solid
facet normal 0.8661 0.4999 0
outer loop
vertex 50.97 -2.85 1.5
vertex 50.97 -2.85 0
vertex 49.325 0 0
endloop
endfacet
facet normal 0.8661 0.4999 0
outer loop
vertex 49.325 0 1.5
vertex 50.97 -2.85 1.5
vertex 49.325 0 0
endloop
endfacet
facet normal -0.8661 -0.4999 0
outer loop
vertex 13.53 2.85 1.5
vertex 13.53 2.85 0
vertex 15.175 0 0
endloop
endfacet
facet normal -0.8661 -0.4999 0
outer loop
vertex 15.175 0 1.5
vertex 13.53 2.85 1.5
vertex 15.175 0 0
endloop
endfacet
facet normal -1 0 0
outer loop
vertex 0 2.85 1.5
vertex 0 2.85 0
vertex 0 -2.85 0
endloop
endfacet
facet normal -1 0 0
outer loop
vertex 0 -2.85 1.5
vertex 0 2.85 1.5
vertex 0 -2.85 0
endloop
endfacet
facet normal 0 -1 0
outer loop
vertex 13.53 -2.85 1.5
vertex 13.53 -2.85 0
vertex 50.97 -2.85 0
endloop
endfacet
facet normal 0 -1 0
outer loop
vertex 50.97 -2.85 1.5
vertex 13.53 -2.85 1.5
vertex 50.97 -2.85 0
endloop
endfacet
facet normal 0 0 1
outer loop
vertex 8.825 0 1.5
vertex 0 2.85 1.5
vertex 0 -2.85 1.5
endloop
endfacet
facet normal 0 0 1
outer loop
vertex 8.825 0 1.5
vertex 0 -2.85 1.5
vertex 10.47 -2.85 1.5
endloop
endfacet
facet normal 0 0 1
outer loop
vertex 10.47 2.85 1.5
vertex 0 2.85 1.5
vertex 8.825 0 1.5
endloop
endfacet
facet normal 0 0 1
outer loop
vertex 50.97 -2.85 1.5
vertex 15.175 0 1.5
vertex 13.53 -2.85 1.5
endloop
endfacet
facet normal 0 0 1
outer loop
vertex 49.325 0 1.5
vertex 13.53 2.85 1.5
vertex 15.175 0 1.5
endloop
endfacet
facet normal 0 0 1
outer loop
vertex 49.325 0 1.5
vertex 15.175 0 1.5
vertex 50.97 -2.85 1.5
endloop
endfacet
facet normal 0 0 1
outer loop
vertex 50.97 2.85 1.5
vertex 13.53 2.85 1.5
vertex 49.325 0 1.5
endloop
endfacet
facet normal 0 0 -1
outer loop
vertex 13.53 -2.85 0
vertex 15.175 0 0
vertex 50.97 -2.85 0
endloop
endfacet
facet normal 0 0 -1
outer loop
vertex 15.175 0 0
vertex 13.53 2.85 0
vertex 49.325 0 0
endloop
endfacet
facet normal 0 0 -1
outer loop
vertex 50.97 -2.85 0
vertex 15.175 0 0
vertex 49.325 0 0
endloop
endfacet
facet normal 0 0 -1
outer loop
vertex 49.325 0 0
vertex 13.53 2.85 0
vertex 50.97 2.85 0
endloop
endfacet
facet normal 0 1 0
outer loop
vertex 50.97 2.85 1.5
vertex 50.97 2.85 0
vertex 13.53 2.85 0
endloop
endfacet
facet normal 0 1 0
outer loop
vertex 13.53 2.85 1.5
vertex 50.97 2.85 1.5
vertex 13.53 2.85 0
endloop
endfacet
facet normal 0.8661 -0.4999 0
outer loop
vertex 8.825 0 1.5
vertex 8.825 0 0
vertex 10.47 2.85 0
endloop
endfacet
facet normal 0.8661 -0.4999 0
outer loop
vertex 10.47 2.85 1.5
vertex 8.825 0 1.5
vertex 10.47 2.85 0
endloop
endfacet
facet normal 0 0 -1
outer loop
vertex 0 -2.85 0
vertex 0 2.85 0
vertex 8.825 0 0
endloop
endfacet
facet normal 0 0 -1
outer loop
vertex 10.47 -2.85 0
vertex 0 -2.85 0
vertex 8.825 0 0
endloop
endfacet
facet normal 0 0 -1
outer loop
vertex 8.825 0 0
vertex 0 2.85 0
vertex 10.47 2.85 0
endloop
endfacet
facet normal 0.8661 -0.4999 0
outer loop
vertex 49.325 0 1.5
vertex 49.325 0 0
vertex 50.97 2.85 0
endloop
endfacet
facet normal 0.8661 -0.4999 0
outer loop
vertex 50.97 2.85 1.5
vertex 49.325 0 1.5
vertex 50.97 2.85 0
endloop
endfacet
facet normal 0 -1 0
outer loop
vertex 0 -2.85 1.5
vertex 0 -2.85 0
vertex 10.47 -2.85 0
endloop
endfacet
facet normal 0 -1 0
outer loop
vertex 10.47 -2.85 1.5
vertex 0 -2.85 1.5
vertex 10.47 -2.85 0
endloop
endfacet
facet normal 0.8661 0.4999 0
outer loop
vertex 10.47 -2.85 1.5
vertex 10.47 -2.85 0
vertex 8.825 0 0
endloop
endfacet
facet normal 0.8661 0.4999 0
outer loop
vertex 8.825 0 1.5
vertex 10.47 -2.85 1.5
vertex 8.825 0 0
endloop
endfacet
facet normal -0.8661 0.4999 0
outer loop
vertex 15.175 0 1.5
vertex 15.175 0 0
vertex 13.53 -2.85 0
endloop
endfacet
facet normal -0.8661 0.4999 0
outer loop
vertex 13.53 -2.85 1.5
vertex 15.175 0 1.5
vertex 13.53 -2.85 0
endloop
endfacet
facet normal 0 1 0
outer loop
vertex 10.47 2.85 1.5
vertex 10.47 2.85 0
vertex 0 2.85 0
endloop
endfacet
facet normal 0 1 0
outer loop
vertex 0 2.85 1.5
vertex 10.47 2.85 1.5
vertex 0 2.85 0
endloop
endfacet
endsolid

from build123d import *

# Parameters (mm, degrees)
BOSS_EXTRUDE1_DEPTH = 1.5
BOSS_EXTRUDE2_DEPTH = 1.5


with BuildPart() as part:
    # Sketch2 → Boss-Extrude1 (new body)
    with BuildSketch(Plane.XY):
        Polygon((0, 2.85), (0, -2.85), (10.470021787, -2.85), (8.824573519, 0), (10.470021787, 2.85), align=None)
    extrude(amount=BOSS_EXTRUDE1_DEPTH)


with BuildPart() as body_2:
    # Sketch3 → Boss-Extrude2 (new body)
    with BuildSketch(Plane.XY):
        Polygon((13.529978213, 2.85), (15.175426481, 0), (13.529978213, -2.85), (50.970021787, -2.85), (49.324573519, 0), (50.970021787, 2.85), align=None)
    extrude(amount=BOSS_EXTRUDE2_DEPTH)


solid = Compound([part.part, body_2.part])
